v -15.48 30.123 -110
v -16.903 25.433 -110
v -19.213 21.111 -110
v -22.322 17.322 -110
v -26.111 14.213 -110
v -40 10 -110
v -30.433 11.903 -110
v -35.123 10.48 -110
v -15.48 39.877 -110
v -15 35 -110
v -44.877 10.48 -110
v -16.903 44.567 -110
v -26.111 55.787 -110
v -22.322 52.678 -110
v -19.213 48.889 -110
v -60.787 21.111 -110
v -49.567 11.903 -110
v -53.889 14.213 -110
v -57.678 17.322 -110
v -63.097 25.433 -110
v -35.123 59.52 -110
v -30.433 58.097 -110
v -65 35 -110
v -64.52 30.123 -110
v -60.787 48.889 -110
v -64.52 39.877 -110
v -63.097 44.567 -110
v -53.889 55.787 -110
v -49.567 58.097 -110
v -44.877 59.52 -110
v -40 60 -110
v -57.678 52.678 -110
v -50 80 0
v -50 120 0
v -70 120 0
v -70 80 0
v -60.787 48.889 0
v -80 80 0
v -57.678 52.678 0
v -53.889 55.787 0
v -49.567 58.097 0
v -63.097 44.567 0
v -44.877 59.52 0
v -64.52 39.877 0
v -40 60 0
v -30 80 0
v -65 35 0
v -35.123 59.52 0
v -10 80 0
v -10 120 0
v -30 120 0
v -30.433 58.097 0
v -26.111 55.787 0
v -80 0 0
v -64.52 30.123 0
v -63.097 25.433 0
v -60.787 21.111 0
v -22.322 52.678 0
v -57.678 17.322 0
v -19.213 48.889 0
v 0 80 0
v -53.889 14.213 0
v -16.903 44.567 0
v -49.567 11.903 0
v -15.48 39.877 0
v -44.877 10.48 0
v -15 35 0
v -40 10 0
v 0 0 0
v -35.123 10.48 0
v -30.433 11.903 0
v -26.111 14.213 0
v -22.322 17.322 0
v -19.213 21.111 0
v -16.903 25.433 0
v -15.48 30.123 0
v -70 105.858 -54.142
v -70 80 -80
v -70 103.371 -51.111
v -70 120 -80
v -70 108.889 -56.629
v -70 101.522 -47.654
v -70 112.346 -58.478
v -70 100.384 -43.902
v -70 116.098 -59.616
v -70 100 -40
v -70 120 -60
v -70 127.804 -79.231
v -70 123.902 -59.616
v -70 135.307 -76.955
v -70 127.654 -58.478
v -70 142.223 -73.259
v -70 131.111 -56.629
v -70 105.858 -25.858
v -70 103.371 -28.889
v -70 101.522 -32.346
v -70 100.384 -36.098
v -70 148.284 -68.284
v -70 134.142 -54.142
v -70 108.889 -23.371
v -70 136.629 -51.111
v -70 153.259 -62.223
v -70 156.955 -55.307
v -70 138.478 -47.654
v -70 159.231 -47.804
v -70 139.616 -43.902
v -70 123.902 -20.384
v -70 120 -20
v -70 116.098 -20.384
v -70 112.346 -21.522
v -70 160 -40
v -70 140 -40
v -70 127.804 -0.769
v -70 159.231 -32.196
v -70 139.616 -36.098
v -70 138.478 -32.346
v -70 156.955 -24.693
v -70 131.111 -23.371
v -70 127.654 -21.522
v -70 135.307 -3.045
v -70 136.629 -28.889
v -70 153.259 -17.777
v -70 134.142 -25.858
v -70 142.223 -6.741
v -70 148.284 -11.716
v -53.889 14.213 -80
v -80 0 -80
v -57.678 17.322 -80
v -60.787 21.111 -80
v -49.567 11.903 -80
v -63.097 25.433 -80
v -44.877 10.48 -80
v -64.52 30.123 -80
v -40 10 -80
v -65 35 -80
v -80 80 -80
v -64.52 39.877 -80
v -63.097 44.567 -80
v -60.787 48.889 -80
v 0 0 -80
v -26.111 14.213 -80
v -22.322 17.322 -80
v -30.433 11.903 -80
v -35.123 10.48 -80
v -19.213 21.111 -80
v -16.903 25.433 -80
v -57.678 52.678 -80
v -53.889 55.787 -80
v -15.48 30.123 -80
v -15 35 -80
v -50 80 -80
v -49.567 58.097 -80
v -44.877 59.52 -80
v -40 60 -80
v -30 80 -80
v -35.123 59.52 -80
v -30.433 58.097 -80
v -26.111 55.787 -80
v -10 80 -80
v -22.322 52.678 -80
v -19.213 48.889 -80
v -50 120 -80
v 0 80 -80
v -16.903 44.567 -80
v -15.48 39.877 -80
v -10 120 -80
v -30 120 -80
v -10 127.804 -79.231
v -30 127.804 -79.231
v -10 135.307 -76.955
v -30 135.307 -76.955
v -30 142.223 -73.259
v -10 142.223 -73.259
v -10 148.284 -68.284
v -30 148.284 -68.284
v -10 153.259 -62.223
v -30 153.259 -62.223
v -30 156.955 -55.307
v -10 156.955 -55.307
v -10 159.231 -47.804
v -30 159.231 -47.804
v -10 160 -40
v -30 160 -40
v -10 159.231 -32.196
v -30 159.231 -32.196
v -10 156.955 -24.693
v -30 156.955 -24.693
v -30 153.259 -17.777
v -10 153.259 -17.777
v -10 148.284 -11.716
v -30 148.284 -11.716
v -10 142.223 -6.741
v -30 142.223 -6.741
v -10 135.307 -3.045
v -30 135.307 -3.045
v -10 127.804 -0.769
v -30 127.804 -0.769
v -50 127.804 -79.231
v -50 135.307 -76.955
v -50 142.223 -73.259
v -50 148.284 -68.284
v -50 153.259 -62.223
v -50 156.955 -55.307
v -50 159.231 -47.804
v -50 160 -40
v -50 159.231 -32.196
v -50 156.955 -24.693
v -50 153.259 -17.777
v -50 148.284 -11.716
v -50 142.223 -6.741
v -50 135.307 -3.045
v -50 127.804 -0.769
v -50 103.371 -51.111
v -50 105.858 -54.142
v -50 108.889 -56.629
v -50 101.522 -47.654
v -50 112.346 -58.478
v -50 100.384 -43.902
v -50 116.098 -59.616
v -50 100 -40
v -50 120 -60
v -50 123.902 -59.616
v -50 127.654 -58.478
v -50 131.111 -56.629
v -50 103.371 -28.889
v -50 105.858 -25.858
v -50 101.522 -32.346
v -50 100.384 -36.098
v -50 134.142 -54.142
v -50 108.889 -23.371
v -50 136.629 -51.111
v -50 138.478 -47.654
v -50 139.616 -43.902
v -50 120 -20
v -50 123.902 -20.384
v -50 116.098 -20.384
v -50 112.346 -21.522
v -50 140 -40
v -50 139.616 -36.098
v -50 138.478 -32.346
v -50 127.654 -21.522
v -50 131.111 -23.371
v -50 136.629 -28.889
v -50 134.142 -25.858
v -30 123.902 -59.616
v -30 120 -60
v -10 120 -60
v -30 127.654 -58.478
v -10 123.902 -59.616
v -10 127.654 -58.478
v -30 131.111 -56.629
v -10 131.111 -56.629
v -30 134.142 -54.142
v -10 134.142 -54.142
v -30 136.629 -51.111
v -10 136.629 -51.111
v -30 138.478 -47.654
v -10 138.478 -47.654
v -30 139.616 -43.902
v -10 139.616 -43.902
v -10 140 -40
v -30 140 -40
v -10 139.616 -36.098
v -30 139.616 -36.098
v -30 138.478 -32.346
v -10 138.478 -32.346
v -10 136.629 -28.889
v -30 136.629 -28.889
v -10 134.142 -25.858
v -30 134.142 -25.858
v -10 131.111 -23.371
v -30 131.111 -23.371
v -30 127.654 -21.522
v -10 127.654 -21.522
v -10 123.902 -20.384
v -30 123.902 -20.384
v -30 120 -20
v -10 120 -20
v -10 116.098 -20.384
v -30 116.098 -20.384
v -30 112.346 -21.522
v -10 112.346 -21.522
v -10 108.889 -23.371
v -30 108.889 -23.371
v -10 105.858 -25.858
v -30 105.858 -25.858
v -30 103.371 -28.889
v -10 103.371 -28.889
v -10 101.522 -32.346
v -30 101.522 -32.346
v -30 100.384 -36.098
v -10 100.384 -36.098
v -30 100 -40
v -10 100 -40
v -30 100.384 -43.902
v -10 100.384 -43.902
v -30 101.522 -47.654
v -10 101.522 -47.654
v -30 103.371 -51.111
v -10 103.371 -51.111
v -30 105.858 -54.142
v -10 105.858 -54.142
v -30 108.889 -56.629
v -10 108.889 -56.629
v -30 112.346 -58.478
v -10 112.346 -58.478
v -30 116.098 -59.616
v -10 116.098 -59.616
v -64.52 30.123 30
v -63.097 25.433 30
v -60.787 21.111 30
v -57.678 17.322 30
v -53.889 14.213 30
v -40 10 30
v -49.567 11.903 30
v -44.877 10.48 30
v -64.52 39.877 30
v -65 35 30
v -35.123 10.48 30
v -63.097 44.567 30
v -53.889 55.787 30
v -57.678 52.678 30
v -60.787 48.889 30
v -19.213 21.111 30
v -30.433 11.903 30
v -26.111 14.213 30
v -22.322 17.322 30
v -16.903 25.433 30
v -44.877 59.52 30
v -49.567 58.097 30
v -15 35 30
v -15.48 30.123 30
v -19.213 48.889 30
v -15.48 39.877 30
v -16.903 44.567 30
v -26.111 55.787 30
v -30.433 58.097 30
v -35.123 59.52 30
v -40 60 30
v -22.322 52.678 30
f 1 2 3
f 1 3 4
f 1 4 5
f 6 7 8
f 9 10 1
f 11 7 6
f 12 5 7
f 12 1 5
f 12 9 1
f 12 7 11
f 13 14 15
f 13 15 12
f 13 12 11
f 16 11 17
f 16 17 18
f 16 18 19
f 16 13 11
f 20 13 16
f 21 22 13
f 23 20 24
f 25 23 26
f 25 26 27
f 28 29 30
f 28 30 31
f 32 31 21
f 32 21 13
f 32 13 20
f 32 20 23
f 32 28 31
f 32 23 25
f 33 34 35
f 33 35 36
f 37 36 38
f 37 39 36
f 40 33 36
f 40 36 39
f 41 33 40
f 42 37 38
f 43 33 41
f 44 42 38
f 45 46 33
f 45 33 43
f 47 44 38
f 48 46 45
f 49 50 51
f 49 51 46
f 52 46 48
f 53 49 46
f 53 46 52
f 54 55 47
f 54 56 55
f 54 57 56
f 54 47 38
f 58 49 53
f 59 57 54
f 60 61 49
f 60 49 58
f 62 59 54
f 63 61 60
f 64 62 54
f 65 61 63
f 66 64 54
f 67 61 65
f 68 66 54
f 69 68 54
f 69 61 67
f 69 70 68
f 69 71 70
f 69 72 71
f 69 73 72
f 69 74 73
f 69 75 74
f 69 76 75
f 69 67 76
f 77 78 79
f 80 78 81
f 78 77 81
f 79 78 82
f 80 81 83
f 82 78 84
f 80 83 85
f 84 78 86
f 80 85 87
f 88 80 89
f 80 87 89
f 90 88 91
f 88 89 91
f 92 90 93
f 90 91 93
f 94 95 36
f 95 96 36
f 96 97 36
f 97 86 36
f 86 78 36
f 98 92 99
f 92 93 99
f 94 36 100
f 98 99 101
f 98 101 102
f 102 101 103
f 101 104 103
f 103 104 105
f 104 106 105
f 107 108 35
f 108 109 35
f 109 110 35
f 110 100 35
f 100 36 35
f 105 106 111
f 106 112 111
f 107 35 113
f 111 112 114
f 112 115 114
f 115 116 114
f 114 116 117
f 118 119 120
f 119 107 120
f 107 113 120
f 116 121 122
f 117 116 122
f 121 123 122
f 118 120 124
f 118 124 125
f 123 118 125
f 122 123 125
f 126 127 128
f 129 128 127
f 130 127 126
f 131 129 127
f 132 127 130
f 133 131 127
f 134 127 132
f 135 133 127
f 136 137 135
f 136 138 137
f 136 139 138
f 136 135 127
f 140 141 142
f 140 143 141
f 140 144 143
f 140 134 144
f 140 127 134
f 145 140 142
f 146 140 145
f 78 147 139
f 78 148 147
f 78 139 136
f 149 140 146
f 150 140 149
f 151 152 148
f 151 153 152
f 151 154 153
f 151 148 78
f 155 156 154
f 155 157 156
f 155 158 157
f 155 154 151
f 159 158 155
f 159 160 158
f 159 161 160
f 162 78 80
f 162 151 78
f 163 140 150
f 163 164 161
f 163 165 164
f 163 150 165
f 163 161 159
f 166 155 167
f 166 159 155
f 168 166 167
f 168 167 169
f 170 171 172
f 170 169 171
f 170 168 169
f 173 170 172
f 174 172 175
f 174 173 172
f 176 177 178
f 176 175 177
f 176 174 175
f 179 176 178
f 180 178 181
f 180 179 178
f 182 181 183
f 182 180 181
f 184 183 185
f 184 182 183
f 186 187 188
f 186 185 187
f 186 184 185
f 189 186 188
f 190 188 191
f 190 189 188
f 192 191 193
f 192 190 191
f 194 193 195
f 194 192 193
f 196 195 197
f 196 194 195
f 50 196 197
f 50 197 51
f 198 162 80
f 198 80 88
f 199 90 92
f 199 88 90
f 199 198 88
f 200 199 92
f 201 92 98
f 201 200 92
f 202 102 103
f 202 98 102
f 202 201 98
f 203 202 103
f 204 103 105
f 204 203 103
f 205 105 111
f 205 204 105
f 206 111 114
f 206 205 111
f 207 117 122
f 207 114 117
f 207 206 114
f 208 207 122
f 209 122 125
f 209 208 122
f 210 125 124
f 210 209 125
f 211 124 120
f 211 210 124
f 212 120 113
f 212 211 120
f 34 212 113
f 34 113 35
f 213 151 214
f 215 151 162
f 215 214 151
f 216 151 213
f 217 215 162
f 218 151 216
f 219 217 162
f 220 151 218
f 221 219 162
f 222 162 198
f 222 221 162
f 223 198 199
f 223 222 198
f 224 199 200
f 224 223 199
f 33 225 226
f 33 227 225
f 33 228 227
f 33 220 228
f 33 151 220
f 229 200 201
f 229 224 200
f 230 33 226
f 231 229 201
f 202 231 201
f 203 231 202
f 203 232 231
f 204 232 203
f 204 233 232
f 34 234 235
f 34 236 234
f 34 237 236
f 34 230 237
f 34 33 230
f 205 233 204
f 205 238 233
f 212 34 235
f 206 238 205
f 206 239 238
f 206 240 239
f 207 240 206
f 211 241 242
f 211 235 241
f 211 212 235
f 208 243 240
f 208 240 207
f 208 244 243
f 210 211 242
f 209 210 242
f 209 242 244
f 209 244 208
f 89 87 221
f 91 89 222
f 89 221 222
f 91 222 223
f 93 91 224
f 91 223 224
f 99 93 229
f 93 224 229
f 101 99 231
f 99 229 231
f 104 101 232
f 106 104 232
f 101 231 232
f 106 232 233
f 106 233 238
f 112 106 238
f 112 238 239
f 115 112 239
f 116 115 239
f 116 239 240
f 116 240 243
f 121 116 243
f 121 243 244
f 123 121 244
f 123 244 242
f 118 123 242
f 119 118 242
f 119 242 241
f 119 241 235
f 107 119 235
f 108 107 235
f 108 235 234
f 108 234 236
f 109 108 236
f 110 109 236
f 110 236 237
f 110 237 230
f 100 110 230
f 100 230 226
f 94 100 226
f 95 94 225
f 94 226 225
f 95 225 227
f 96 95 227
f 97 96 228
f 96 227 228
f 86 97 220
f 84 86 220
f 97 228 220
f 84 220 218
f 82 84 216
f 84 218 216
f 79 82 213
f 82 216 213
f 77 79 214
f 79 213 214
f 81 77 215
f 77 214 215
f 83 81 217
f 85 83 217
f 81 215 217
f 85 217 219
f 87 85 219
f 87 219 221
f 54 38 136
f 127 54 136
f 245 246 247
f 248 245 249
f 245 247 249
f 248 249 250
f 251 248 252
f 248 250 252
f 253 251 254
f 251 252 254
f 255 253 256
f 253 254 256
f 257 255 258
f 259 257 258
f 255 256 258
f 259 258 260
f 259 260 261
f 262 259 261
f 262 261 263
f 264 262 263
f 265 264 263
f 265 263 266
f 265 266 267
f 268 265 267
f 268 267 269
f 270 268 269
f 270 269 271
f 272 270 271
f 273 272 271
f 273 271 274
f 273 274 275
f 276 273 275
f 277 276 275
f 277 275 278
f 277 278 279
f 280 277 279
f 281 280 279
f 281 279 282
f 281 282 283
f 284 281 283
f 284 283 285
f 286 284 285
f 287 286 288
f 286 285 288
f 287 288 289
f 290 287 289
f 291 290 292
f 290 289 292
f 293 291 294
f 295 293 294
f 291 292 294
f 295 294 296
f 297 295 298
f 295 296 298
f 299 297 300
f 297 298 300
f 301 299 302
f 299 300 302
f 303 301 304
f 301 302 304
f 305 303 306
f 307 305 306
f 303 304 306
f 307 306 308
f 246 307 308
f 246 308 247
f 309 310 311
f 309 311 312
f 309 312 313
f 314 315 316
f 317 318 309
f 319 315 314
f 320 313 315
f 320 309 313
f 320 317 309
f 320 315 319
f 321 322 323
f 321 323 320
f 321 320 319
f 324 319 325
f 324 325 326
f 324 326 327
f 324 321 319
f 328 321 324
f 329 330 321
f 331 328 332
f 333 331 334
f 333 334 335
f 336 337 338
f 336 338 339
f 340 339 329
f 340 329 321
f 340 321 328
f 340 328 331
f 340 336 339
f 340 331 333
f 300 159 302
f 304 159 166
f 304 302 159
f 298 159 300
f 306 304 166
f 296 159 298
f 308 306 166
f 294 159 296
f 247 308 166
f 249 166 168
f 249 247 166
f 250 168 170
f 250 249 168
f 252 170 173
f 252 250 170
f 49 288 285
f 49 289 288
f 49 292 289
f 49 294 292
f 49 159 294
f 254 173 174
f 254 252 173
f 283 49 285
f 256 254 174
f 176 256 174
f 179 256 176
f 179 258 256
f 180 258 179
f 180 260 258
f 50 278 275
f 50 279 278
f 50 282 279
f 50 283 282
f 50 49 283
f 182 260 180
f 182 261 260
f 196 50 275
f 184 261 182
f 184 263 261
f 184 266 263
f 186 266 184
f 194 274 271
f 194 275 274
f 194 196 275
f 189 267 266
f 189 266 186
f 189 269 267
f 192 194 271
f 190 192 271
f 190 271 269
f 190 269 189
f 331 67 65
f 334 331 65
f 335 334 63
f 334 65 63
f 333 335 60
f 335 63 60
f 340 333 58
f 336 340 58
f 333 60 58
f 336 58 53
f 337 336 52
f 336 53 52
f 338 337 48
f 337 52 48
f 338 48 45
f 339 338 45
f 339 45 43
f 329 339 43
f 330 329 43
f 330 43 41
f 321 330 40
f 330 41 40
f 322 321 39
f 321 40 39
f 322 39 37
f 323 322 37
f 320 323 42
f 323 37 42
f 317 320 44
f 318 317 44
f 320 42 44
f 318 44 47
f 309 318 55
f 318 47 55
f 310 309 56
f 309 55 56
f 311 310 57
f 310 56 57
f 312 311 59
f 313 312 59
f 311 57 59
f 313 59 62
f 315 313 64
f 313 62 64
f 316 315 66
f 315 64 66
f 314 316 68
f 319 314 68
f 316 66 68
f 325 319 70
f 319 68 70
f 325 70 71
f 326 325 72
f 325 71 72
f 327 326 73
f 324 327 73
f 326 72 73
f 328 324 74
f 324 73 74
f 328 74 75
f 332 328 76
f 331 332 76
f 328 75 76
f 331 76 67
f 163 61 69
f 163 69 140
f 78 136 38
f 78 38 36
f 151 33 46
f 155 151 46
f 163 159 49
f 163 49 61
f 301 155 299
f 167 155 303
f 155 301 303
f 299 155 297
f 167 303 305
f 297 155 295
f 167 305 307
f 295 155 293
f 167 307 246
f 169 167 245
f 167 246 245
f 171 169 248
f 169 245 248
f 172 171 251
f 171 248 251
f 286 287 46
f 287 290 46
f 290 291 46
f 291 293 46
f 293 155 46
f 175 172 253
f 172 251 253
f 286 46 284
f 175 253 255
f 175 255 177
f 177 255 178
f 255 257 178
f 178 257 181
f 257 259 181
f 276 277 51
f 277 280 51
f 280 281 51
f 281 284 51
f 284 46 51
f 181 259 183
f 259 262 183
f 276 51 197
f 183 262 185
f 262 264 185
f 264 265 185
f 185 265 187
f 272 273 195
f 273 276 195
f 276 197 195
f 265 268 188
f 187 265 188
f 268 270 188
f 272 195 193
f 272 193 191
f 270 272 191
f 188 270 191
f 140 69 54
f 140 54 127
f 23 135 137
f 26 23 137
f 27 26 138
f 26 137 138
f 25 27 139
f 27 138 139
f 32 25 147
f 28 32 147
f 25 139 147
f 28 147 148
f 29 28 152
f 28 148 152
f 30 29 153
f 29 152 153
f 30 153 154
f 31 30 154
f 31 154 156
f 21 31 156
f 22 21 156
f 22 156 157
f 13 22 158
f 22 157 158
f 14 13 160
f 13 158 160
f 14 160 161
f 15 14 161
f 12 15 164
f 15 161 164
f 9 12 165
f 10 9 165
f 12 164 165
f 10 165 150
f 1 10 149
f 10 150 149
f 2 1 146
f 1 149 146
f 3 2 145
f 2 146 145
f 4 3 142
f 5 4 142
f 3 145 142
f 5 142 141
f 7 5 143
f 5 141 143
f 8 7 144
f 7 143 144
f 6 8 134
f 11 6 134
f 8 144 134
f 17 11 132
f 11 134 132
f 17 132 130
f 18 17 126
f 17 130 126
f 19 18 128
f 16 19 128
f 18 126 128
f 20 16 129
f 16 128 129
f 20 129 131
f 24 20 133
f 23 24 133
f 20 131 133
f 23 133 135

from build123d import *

# Parameters (mm, degrees)
CROQUIS2_R              = 20
SALIENTE_EXTRUIR1_DEPTH = 80
CORTAR_EXTRUIR1_REACH   = 82
CROQUIS3_W              = 10
CROQUIS3_H              = 80
CROQUIS3_W_2            = 20
CROQUIS4_R              = 25
SALIENTE_EXTRUIR2_DEPTH = 30
CROQUIS5_R              = 25
SALIENTE_EXTRUIR3_DEPTH = 30


with BuildPart() as part:
    # Croquis2 → Saliente-Extruir1 (new body)
    with BuildSketch(Plane(origin=(0, 0, 0), x_dir=(0, 0, -1), z_dir=(1, 0, 0))):
        with BuildLine():
            Line((0, 0), (80, 0))
            Line((80, 0), (80, 120))
            ThreePointArc((80, 120), (40, 160), (0, 120))
            Line((0, 120), (0, 0))
        make_face()
        with Locations((40, 120)):
            Circle(CROQUIS2_R, mode=Mode.SUBTRACT)
    extrude(amount=-SALIENTE_EXTRUIR1_DEPTH)

    # Croquis3 → Cortar-Extruir1 (cut, up to next)
    with BuildSketch(Plane.XY, mode=Mode.PRIVATE) as cortar_extruir1_sk1:
        with Locations((-5, 120)):
            Rectangle(CROQUIS3_W, CROQUIS3_H)
    cortar_extruir1_tool1 = extrude(cortar_extruir1_sk1.sketch, amount=-CORTAR_EXTRUIR1_REACH, mode=Mode.PRIVATE) & part.part
    add(cortar_extruir1_tool1.solids().sort_by_distance((-5, 120, 0))[0], mode=Mode.SUBTRACT)
    # Croquis3 → Cortar-Extruir1 (cut, up to next)
    with BuildSketch(Plane.XY, mode=Mode.PRIVATE) as cortar_extruir1_sk2:
        with Locations((-75, 120)):
            Rectangle(CROQUIS3_W, CROQUIS3_H)
    cortar_extruir1_tool2 = extrude(cortar_extruir1_sk2.sketch, amount=-CORTAR_EXTRUIR1_REACH, mode=Mode.PRIVATE) & part.part
    add(cortar_extruir1_tool2.solids().sort_by_distance((-75, 120, 0))[0], mode=Mode.SUBTRACT)
    # Croquis3 → Cortar-Extruir1 (cut, up to next)
    with BuildSketch(Plane.XY, mode=Mode.PRIVATE) as cortar_extruir1_sk3:
        with Locations((-40, 120)):
            Rectangle(CROQUIS3_W_2, CROQUIS3_H)
    cortar_extruir1_tool3 = extrude(cortar_extruir1_sk3.sketch, amount=-CORTAR_EXTRUIR1_REACH, mode=Mode.PRIVATE) & part.part
    add(cortar_extruir1_tool3.solids().sort_by_distance((-40, 120, 0))[0], mode=Mode.SUBTRACT)

    # Croquis4 → Saliente-Extruir2 (add)
    with BuildSketch(Plane.XY):
        with Locations((-40, 35)):
            Circle(CROQUIS4_R)
    extrude(amount=SALIENTE_EXTRUIR2_DEPTH)

    # Croquis5 → Saliente-Extruir3 (add)
    with BuildSketch(Plane(origin=(0, 0, -80), x_dir=(-1, 0, 0), z_dir=(0, 0, -1))):
        with Locations((40, 35)):
            Circle(CROQUIS5_R)
    extrude(amount=SALIENTE_EXTRUIR3_DEPTH)


solid = part.part
